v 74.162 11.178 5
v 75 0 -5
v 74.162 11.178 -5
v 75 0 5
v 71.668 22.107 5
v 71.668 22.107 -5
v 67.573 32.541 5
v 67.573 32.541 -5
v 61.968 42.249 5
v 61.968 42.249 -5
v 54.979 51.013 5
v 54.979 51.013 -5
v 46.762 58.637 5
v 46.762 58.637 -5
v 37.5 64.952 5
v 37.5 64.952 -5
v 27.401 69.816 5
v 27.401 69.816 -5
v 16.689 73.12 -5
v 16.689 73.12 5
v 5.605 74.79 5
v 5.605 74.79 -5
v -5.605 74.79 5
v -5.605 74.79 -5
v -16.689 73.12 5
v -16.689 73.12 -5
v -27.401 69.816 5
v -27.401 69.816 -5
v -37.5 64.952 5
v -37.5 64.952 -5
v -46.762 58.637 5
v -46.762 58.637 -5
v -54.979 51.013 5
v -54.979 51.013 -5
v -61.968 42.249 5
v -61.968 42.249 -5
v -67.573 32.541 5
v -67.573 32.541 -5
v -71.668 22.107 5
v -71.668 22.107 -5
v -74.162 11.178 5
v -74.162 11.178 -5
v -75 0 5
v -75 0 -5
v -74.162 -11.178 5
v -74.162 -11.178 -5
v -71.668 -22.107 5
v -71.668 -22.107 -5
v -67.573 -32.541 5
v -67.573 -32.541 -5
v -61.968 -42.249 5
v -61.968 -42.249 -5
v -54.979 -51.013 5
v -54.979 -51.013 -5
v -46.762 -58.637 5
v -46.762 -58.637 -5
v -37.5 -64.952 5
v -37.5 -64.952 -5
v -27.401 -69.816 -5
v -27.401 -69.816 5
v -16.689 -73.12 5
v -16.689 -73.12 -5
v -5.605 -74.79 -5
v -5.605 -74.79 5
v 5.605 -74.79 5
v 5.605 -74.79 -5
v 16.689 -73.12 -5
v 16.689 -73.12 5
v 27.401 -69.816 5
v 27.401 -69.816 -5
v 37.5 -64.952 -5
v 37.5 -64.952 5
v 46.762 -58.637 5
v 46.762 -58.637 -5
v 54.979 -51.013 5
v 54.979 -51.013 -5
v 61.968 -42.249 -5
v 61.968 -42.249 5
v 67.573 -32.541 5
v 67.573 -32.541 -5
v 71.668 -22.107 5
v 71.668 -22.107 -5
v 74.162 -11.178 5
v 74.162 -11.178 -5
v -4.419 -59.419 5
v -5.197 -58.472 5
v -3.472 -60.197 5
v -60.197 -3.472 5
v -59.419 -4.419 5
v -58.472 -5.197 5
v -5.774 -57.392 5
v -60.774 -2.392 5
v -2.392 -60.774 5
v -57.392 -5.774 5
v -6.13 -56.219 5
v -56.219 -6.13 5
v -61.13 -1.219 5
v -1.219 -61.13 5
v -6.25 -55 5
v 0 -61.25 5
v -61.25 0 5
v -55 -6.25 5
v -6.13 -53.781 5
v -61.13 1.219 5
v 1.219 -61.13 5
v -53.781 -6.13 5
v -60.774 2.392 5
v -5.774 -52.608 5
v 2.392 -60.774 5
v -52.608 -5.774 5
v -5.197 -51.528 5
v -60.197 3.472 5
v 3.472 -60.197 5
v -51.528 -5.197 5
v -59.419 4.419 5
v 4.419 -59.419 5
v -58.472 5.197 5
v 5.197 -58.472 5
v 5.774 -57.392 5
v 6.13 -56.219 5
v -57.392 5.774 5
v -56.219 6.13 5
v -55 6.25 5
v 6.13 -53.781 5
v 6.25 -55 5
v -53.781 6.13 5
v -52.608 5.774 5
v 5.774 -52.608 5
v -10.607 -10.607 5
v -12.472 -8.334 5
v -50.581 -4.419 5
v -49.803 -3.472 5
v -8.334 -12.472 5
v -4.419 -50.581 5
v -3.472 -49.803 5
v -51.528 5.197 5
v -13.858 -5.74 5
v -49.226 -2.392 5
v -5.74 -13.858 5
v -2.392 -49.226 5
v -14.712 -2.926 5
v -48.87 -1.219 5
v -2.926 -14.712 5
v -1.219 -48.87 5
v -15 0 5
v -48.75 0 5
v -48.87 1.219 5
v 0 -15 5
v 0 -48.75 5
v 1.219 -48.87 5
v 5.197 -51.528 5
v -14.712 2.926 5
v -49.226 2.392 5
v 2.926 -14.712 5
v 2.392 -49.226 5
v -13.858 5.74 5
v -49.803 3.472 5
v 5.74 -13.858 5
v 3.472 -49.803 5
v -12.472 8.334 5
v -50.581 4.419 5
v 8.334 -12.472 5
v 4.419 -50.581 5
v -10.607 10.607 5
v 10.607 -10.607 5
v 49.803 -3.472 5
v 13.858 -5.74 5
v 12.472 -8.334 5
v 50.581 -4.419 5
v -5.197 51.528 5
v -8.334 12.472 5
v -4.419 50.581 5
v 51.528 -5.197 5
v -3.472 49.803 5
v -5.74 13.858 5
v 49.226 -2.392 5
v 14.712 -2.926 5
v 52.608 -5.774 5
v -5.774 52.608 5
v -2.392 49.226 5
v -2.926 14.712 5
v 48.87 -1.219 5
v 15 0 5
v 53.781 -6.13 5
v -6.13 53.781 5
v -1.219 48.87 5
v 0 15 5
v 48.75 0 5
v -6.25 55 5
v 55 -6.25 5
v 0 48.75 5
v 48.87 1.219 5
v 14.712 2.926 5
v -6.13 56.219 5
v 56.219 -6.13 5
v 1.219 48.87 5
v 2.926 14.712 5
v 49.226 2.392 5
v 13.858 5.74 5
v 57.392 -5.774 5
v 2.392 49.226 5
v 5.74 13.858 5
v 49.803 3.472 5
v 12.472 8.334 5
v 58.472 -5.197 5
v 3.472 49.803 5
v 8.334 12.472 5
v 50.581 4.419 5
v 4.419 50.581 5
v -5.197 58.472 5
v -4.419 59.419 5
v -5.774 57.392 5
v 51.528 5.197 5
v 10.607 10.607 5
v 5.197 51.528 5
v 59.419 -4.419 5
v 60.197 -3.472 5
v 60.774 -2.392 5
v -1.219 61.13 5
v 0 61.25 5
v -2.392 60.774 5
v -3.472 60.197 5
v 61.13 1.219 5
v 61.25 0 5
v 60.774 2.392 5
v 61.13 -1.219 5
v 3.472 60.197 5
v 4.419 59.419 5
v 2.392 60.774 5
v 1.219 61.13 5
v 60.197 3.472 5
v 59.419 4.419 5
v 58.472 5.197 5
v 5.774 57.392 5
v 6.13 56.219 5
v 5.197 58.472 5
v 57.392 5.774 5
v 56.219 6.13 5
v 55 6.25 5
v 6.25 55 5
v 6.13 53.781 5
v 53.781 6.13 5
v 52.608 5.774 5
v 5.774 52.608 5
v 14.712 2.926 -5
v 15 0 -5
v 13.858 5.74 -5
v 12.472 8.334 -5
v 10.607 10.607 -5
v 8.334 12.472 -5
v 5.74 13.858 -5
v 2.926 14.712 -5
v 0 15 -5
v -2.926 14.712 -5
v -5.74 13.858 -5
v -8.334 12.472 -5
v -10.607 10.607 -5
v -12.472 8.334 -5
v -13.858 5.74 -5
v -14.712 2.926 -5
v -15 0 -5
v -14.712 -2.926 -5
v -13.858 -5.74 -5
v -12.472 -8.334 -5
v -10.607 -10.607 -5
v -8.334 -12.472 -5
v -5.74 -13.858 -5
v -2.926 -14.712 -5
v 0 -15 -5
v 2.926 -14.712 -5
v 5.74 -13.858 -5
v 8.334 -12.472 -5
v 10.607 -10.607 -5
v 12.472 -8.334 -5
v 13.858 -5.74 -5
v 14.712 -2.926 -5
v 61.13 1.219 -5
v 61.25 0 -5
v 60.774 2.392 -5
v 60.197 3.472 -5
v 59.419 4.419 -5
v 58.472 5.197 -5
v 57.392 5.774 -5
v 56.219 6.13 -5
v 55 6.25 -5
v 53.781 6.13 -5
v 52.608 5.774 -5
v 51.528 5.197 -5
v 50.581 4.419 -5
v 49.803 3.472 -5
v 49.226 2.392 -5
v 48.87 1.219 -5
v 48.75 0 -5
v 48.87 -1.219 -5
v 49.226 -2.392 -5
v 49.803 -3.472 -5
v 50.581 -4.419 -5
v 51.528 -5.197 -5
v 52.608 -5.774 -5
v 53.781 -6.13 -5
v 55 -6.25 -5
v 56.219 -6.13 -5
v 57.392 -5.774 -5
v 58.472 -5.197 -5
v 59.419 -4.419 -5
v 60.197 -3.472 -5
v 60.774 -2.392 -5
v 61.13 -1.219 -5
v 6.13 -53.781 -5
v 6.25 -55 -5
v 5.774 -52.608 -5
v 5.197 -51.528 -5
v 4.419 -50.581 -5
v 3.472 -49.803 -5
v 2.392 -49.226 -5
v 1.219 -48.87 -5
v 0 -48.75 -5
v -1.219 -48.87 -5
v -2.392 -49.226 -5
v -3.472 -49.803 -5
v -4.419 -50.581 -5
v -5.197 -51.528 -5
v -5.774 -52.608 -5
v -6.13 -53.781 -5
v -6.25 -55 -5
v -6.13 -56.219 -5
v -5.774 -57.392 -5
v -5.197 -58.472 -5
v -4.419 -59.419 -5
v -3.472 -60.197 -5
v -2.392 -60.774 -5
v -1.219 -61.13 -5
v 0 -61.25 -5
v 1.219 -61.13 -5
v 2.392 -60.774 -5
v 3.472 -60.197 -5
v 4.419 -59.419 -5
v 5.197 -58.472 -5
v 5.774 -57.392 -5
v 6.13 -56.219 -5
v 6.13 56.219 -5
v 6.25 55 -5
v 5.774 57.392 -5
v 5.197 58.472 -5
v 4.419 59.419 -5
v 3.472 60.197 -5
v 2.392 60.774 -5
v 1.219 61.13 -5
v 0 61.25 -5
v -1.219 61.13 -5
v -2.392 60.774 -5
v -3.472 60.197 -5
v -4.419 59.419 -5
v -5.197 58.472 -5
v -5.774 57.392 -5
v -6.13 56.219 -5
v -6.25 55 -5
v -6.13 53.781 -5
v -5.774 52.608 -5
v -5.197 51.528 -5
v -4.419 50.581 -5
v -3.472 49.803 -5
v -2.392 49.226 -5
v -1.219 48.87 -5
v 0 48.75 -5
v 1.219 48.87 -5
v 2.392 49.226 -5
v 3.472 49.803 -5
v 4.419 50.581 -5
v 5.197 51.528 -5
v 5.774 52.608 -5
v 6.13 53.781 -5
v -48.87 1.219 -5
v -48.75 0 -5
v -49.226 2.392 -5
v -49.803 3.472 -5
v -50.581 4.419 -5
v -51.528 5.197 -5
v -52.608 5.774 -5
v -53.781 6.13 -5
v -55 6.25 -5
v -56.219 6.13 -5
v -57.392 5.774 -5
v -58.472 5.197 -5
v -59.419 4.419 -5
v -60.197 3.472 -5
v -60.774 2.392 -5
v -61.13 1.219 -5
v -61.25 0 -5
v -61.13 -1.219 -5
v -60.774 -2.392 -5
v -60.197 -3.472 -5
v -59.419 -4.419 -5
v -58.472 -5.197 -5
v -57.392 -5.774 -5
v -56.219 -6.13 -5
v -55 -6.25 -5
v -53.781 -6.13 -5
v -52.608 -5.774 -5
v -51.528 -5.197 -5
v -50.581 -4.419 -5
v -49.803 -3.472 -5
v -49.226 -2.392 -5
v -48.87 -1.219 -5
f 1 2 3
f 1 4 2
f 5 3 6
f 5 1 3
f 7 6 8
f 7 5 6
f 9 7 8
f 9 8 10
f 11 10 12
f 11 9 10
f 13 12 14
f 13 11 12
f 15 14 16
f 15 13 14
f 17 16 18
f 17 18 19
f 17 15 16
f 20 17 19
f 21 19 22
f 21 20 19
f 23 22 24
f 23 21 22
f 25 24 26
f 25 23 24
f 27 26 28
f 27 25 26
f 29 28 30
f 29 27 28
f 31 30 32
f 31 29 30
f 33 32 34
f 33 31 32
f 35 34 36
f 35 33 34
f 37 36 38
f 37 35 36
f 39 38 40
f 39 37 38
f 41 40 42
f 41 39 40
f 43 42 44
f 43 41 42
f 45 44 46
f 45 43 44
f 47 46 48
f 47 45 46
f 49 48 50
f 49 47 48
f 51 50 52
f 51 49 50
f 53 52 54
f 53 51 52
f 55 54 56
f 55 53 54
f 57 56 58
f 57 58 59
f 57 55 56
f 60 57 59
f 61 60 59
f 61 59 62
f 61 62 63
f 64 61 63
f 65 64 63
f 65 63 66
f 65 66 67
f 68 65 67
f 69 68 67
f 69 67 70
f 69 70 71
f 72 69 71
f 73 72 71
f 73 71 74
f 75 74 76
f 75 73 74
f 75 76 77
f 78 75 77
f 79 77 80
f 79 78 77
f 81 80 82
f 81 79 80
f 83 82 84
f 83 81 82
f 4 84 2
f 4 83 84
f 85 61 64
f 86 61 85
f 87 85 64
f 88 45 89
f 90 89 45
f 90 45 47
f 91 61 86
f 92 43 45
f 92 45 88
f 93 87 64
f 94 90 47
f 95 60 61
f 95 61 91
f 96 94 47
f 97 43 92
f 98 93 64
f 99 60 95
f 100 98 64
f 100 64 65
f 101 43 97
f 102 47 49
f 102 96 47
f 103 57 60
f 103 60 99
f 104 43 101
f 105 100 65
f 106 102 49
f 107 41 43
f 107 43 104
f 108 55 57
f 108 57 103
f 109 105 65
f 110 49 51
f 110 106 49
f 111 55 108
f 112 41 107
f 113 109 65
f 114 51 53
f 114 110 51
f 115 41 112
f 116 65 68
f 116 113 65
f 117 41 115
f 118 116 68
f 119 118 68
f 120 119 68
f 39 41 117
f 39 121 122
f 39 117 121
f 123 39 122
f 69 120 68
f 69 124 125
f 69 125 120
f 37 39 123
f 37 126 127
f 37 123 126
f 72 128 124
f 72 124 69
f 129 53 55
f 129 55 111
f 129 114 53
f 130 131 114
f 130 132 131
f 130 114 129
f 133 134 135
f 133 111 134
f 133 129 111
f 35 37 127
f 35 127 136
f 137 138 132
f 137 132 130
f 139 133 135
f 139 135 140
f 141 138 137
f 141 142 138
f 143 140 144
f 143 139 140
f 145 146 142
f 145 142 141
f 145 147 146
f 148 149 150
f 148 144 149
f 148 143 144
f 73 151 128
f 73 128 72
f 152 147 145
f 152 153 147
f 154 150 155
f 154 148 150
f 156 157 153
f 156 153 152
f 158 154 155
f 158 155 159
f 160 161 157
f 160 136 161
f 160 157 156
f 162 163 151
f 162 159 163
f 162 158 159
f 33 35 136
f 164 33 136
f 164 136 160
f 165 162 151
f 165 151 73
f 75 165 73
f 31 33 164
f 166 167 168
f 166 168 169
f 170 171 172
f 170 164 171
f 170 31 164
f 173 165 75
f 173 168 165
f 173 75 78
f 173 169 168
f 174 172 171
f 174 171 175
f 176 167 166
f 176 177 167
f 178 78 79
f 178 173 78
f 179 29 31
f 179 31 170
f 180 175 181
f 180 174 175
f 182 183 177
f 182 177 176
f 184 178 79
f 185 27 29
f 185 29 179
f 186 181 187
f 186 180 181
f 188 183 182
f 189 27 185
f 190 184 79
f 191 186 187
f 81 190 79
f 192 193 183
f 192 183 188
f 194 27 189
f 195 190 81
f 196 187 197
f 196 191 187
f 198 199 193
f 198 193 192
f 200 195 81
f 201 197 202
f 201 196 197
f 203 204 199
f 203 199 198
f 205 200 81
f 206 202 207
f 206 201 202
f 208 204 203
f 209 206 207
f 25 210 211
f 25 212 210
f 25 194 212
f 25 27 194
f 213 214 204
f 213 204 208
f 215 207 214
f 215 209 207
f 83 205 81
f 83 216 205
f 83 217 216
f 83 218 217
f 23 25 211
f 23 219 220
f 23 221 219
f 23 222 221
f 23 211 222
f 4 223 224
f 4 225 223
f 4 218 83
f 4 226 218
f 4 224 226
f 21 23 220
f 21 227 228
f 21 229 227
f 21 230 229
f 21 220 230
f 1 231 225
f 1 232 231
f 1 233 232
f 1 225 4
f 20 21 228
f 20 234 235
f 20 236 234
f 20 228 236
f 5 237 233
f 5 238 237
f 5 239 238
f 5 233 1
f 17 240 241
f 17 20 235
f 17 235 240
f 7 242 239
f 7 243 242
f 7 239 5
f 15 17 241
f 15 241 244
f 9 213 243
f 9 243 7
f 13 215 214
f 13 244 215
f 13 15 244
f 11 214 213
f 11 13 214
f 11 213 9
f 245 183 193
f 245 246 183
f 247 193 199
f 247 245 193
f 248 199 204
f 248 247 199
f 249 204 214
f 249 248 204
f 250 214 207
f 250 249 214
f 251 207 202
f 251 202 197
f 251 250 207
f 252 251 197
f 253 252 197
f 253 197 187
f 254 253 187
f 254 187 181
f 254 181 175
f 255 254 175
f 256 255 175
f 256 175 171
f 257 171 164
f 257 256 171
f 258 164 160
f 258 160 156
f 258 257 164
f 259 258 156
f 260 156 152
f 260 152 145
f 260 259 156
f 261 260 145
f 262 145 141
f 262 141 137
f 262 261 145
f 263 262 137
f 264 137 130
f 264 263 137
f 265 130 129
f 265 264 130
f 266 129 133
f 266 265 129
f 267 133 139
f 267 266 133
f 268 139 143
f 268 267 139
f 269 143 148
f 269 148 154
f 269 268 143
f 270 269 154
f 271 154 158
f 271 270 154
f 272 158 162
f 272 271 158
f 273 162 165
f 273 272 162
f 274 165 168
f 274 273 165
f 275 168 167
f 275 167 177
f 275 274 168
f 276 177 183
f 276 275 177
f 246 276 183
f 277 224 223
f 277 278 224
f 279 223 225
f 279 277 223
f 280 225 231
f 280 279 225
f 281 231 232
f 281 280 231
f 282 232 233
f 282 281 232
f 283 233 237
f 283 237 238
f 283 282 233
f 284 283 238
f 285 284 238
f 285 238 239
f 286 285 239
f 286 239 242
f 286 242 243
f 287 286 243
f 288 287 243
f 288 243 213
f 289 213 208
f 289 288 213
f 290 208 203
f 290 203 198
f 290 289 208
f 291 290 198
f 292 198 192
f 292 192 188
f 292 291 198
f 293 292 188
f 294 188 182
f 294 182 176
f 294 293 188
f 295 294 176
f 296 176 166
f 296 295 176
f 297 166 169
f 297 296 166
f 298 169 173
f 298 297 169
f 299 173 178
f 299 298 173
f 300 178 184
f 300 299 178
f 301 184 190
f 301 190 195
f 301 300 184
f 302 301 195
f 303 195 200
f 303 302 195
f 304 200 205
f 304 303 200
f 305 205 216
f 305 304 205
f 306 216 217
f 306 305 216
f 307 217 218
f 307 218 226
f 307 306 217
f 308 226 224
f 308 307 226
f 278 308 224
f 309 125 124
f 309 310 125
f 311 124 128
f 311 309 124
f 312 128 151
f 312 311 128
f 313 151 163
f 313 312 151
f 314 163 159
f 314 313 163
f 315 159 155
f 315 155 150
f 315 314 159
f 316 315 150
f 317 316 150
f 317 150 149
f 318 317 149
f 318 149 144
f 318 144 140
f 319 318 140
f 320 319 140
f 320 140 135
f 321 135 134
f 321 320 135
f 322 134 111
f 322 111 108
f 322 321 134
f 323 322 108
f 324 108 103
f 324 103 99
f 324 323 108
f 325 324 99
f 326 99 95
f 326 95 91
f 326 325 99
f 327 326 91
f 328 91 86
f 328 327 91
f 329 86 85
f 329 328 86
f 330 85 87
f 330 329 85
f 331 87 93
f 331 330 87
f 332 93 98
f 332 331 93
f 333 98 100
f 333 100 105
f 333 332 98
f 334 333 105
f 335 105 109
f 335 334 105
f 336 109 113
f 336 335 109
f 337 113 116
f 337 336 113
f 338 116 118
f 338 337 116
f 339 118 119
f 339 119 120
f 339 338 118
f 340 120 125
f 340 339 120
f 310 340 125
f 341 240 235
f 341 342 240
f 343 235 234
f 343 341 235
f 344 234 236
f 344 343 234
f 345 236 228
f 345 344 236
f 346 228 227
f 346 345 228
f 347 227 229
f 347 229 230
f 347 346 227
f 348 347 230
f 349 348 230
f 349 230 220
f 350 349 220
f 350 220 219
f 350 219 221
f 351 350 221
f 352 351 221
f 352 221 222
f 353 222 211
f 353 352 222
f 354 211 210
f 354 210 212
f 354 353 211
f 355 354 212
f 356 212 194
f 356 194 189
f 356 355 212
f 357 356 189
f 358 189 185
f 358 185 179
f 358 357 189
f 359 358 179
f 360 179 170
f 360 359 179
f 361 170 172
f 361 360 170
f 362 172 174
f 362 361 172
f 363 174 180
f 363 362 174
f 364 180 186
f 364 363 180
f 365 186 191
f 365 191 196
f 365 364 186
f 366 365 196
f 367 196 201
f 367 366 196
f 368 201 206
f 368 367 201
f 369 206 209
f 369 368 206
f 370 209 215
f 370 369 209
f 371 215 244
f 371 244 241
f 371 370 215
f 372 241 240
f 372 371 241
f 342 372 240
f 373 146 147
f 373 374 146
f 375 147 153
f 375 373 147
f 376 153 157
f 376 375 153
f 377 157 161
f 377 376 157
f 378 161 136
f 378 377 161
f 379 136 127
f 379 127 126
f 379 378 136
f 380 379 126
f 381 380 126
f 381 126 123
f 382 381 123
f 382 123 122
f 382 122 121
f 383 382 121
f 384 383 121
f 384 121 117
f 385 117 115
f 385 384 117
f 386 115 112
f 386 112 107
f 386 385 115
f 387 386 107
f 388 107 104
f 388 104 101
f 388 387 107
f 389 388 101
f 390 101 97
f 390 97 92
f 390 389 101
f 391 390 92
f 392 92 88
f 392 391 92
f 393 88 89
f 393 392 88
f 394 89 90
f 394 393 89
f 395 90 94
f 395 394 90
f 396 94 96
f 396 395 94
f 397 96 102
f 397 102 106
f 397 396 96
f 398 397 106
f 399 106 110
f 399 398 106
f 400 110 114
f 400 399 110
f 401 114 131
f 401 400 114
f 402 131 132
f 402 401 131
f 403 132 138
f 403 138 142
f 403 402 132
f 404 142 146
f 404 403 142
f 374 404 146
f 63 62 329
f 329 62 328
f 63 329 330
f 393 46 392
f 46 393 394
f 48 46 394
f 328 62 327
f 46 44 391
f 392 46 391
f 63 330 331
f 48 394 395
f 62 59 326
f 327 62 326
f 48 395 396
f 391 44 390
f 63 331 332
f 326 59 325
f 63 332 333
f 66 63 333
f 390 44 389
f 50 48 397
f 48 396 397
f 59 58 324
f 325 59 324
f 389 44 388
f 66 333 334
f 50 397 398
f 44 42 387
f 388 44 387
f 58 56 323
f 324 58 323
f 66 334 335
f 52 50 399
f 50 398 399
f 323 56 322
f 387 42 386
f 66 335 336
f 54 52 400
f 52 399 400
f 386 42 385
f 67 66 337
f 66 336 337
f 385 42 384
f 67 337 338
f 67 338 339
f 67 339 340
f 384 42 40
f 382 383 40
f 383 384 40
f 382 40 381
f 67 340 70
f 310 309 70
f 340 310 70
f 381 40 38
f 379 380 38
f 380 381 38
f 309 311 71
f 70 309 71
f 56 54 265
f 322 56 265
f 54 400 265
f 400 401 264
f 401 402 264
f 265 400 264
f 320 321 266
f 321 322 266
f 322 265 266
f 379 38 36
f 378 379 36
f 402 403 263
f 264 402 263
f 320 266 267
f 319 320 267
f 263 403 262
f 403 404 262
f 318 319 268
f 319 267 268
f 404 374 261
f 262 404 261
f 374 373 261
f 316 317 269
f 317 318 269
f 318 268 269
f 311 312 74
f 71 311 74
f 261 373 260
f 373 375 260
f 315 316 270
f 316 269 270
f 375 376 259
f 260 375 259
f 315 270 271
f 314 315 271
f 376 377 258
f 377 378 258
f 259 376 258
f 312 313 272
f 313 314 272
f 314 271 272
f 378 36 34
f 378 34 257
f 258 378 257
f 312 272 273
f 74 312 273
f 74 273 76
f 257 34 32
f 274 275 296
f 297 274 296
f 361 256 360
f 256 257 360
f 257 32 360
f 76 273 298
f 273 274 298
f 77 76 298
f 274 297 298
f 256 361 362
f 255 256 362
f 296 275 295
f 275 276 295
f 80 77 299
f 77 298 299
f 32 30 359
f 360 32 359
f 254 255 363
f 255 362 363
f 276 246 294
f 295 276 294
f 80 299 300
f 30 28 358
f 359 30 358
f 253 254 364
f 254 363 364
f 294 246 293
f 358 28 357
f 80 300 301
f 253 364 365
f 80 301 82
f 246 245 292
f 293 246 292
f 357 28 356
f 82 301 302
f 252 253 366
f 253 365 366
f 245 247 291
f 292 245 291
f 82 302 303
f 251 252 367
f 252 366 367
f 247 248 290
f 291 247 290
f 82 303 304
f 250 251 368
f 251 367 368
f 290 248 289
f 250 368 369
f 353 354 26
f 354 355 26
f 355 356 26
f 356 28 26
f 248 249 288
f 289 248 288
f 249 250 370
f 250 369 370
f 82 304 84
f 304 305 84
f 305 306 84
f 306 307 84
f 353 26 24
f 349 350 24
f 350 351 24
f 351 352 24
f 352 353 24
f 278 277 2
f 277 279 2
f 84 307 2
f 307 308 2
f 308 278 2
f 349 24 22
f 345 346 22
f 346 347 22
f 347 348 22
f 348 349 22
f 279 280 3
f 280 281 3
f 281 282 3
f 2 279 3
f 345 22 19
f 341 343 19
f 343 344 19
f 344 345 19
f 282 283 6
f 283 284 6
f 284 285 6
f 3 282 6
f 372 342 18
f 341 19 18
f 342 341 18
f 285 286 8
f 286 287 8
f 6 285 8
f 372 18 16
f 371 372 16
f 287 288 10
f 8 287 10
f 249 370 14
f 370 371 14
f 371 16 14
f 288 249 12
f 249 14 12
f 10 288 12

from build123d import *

# Parameters (mm, degrees)
ESQUISSE1_R        = 75
ESQUISSE1_R_2      = 15
ESQUISSE1_R_3      = 6.25
BOSS_EXTRU_1_DEPTH = 5


with BuildPart() as part:
    # Esquisse1 → Boss.-Extru.1 (new body, symmetric)
    with BuildSketch(Plane.XY):
        Circle(ESQUISSE1_R)
        Circle(ESQUISSE1_R_2, mode=Mode.SUBTRACT)
        with Locations((0, 55)):
            Circle(ESQUISSE1_R_3, mode=Mode.SUBTRACT)
        with Locations((-55, 0)):
            Circle(ESQUISSE1_R_3, mode=Mode.SUBTRACT)
        with Locations((0, -55)):
            Circle(ESQUISSE1_R_3, mode=Mode.SUBTRACT)
        with Locations((55, 0)):
            Circle(ESQUISSE1_R_3, mode=Mode.SUBTRACT)
    extrude(amount=BOSS_EXTRU_1_DEPTH, both=True)


solid = part.part
